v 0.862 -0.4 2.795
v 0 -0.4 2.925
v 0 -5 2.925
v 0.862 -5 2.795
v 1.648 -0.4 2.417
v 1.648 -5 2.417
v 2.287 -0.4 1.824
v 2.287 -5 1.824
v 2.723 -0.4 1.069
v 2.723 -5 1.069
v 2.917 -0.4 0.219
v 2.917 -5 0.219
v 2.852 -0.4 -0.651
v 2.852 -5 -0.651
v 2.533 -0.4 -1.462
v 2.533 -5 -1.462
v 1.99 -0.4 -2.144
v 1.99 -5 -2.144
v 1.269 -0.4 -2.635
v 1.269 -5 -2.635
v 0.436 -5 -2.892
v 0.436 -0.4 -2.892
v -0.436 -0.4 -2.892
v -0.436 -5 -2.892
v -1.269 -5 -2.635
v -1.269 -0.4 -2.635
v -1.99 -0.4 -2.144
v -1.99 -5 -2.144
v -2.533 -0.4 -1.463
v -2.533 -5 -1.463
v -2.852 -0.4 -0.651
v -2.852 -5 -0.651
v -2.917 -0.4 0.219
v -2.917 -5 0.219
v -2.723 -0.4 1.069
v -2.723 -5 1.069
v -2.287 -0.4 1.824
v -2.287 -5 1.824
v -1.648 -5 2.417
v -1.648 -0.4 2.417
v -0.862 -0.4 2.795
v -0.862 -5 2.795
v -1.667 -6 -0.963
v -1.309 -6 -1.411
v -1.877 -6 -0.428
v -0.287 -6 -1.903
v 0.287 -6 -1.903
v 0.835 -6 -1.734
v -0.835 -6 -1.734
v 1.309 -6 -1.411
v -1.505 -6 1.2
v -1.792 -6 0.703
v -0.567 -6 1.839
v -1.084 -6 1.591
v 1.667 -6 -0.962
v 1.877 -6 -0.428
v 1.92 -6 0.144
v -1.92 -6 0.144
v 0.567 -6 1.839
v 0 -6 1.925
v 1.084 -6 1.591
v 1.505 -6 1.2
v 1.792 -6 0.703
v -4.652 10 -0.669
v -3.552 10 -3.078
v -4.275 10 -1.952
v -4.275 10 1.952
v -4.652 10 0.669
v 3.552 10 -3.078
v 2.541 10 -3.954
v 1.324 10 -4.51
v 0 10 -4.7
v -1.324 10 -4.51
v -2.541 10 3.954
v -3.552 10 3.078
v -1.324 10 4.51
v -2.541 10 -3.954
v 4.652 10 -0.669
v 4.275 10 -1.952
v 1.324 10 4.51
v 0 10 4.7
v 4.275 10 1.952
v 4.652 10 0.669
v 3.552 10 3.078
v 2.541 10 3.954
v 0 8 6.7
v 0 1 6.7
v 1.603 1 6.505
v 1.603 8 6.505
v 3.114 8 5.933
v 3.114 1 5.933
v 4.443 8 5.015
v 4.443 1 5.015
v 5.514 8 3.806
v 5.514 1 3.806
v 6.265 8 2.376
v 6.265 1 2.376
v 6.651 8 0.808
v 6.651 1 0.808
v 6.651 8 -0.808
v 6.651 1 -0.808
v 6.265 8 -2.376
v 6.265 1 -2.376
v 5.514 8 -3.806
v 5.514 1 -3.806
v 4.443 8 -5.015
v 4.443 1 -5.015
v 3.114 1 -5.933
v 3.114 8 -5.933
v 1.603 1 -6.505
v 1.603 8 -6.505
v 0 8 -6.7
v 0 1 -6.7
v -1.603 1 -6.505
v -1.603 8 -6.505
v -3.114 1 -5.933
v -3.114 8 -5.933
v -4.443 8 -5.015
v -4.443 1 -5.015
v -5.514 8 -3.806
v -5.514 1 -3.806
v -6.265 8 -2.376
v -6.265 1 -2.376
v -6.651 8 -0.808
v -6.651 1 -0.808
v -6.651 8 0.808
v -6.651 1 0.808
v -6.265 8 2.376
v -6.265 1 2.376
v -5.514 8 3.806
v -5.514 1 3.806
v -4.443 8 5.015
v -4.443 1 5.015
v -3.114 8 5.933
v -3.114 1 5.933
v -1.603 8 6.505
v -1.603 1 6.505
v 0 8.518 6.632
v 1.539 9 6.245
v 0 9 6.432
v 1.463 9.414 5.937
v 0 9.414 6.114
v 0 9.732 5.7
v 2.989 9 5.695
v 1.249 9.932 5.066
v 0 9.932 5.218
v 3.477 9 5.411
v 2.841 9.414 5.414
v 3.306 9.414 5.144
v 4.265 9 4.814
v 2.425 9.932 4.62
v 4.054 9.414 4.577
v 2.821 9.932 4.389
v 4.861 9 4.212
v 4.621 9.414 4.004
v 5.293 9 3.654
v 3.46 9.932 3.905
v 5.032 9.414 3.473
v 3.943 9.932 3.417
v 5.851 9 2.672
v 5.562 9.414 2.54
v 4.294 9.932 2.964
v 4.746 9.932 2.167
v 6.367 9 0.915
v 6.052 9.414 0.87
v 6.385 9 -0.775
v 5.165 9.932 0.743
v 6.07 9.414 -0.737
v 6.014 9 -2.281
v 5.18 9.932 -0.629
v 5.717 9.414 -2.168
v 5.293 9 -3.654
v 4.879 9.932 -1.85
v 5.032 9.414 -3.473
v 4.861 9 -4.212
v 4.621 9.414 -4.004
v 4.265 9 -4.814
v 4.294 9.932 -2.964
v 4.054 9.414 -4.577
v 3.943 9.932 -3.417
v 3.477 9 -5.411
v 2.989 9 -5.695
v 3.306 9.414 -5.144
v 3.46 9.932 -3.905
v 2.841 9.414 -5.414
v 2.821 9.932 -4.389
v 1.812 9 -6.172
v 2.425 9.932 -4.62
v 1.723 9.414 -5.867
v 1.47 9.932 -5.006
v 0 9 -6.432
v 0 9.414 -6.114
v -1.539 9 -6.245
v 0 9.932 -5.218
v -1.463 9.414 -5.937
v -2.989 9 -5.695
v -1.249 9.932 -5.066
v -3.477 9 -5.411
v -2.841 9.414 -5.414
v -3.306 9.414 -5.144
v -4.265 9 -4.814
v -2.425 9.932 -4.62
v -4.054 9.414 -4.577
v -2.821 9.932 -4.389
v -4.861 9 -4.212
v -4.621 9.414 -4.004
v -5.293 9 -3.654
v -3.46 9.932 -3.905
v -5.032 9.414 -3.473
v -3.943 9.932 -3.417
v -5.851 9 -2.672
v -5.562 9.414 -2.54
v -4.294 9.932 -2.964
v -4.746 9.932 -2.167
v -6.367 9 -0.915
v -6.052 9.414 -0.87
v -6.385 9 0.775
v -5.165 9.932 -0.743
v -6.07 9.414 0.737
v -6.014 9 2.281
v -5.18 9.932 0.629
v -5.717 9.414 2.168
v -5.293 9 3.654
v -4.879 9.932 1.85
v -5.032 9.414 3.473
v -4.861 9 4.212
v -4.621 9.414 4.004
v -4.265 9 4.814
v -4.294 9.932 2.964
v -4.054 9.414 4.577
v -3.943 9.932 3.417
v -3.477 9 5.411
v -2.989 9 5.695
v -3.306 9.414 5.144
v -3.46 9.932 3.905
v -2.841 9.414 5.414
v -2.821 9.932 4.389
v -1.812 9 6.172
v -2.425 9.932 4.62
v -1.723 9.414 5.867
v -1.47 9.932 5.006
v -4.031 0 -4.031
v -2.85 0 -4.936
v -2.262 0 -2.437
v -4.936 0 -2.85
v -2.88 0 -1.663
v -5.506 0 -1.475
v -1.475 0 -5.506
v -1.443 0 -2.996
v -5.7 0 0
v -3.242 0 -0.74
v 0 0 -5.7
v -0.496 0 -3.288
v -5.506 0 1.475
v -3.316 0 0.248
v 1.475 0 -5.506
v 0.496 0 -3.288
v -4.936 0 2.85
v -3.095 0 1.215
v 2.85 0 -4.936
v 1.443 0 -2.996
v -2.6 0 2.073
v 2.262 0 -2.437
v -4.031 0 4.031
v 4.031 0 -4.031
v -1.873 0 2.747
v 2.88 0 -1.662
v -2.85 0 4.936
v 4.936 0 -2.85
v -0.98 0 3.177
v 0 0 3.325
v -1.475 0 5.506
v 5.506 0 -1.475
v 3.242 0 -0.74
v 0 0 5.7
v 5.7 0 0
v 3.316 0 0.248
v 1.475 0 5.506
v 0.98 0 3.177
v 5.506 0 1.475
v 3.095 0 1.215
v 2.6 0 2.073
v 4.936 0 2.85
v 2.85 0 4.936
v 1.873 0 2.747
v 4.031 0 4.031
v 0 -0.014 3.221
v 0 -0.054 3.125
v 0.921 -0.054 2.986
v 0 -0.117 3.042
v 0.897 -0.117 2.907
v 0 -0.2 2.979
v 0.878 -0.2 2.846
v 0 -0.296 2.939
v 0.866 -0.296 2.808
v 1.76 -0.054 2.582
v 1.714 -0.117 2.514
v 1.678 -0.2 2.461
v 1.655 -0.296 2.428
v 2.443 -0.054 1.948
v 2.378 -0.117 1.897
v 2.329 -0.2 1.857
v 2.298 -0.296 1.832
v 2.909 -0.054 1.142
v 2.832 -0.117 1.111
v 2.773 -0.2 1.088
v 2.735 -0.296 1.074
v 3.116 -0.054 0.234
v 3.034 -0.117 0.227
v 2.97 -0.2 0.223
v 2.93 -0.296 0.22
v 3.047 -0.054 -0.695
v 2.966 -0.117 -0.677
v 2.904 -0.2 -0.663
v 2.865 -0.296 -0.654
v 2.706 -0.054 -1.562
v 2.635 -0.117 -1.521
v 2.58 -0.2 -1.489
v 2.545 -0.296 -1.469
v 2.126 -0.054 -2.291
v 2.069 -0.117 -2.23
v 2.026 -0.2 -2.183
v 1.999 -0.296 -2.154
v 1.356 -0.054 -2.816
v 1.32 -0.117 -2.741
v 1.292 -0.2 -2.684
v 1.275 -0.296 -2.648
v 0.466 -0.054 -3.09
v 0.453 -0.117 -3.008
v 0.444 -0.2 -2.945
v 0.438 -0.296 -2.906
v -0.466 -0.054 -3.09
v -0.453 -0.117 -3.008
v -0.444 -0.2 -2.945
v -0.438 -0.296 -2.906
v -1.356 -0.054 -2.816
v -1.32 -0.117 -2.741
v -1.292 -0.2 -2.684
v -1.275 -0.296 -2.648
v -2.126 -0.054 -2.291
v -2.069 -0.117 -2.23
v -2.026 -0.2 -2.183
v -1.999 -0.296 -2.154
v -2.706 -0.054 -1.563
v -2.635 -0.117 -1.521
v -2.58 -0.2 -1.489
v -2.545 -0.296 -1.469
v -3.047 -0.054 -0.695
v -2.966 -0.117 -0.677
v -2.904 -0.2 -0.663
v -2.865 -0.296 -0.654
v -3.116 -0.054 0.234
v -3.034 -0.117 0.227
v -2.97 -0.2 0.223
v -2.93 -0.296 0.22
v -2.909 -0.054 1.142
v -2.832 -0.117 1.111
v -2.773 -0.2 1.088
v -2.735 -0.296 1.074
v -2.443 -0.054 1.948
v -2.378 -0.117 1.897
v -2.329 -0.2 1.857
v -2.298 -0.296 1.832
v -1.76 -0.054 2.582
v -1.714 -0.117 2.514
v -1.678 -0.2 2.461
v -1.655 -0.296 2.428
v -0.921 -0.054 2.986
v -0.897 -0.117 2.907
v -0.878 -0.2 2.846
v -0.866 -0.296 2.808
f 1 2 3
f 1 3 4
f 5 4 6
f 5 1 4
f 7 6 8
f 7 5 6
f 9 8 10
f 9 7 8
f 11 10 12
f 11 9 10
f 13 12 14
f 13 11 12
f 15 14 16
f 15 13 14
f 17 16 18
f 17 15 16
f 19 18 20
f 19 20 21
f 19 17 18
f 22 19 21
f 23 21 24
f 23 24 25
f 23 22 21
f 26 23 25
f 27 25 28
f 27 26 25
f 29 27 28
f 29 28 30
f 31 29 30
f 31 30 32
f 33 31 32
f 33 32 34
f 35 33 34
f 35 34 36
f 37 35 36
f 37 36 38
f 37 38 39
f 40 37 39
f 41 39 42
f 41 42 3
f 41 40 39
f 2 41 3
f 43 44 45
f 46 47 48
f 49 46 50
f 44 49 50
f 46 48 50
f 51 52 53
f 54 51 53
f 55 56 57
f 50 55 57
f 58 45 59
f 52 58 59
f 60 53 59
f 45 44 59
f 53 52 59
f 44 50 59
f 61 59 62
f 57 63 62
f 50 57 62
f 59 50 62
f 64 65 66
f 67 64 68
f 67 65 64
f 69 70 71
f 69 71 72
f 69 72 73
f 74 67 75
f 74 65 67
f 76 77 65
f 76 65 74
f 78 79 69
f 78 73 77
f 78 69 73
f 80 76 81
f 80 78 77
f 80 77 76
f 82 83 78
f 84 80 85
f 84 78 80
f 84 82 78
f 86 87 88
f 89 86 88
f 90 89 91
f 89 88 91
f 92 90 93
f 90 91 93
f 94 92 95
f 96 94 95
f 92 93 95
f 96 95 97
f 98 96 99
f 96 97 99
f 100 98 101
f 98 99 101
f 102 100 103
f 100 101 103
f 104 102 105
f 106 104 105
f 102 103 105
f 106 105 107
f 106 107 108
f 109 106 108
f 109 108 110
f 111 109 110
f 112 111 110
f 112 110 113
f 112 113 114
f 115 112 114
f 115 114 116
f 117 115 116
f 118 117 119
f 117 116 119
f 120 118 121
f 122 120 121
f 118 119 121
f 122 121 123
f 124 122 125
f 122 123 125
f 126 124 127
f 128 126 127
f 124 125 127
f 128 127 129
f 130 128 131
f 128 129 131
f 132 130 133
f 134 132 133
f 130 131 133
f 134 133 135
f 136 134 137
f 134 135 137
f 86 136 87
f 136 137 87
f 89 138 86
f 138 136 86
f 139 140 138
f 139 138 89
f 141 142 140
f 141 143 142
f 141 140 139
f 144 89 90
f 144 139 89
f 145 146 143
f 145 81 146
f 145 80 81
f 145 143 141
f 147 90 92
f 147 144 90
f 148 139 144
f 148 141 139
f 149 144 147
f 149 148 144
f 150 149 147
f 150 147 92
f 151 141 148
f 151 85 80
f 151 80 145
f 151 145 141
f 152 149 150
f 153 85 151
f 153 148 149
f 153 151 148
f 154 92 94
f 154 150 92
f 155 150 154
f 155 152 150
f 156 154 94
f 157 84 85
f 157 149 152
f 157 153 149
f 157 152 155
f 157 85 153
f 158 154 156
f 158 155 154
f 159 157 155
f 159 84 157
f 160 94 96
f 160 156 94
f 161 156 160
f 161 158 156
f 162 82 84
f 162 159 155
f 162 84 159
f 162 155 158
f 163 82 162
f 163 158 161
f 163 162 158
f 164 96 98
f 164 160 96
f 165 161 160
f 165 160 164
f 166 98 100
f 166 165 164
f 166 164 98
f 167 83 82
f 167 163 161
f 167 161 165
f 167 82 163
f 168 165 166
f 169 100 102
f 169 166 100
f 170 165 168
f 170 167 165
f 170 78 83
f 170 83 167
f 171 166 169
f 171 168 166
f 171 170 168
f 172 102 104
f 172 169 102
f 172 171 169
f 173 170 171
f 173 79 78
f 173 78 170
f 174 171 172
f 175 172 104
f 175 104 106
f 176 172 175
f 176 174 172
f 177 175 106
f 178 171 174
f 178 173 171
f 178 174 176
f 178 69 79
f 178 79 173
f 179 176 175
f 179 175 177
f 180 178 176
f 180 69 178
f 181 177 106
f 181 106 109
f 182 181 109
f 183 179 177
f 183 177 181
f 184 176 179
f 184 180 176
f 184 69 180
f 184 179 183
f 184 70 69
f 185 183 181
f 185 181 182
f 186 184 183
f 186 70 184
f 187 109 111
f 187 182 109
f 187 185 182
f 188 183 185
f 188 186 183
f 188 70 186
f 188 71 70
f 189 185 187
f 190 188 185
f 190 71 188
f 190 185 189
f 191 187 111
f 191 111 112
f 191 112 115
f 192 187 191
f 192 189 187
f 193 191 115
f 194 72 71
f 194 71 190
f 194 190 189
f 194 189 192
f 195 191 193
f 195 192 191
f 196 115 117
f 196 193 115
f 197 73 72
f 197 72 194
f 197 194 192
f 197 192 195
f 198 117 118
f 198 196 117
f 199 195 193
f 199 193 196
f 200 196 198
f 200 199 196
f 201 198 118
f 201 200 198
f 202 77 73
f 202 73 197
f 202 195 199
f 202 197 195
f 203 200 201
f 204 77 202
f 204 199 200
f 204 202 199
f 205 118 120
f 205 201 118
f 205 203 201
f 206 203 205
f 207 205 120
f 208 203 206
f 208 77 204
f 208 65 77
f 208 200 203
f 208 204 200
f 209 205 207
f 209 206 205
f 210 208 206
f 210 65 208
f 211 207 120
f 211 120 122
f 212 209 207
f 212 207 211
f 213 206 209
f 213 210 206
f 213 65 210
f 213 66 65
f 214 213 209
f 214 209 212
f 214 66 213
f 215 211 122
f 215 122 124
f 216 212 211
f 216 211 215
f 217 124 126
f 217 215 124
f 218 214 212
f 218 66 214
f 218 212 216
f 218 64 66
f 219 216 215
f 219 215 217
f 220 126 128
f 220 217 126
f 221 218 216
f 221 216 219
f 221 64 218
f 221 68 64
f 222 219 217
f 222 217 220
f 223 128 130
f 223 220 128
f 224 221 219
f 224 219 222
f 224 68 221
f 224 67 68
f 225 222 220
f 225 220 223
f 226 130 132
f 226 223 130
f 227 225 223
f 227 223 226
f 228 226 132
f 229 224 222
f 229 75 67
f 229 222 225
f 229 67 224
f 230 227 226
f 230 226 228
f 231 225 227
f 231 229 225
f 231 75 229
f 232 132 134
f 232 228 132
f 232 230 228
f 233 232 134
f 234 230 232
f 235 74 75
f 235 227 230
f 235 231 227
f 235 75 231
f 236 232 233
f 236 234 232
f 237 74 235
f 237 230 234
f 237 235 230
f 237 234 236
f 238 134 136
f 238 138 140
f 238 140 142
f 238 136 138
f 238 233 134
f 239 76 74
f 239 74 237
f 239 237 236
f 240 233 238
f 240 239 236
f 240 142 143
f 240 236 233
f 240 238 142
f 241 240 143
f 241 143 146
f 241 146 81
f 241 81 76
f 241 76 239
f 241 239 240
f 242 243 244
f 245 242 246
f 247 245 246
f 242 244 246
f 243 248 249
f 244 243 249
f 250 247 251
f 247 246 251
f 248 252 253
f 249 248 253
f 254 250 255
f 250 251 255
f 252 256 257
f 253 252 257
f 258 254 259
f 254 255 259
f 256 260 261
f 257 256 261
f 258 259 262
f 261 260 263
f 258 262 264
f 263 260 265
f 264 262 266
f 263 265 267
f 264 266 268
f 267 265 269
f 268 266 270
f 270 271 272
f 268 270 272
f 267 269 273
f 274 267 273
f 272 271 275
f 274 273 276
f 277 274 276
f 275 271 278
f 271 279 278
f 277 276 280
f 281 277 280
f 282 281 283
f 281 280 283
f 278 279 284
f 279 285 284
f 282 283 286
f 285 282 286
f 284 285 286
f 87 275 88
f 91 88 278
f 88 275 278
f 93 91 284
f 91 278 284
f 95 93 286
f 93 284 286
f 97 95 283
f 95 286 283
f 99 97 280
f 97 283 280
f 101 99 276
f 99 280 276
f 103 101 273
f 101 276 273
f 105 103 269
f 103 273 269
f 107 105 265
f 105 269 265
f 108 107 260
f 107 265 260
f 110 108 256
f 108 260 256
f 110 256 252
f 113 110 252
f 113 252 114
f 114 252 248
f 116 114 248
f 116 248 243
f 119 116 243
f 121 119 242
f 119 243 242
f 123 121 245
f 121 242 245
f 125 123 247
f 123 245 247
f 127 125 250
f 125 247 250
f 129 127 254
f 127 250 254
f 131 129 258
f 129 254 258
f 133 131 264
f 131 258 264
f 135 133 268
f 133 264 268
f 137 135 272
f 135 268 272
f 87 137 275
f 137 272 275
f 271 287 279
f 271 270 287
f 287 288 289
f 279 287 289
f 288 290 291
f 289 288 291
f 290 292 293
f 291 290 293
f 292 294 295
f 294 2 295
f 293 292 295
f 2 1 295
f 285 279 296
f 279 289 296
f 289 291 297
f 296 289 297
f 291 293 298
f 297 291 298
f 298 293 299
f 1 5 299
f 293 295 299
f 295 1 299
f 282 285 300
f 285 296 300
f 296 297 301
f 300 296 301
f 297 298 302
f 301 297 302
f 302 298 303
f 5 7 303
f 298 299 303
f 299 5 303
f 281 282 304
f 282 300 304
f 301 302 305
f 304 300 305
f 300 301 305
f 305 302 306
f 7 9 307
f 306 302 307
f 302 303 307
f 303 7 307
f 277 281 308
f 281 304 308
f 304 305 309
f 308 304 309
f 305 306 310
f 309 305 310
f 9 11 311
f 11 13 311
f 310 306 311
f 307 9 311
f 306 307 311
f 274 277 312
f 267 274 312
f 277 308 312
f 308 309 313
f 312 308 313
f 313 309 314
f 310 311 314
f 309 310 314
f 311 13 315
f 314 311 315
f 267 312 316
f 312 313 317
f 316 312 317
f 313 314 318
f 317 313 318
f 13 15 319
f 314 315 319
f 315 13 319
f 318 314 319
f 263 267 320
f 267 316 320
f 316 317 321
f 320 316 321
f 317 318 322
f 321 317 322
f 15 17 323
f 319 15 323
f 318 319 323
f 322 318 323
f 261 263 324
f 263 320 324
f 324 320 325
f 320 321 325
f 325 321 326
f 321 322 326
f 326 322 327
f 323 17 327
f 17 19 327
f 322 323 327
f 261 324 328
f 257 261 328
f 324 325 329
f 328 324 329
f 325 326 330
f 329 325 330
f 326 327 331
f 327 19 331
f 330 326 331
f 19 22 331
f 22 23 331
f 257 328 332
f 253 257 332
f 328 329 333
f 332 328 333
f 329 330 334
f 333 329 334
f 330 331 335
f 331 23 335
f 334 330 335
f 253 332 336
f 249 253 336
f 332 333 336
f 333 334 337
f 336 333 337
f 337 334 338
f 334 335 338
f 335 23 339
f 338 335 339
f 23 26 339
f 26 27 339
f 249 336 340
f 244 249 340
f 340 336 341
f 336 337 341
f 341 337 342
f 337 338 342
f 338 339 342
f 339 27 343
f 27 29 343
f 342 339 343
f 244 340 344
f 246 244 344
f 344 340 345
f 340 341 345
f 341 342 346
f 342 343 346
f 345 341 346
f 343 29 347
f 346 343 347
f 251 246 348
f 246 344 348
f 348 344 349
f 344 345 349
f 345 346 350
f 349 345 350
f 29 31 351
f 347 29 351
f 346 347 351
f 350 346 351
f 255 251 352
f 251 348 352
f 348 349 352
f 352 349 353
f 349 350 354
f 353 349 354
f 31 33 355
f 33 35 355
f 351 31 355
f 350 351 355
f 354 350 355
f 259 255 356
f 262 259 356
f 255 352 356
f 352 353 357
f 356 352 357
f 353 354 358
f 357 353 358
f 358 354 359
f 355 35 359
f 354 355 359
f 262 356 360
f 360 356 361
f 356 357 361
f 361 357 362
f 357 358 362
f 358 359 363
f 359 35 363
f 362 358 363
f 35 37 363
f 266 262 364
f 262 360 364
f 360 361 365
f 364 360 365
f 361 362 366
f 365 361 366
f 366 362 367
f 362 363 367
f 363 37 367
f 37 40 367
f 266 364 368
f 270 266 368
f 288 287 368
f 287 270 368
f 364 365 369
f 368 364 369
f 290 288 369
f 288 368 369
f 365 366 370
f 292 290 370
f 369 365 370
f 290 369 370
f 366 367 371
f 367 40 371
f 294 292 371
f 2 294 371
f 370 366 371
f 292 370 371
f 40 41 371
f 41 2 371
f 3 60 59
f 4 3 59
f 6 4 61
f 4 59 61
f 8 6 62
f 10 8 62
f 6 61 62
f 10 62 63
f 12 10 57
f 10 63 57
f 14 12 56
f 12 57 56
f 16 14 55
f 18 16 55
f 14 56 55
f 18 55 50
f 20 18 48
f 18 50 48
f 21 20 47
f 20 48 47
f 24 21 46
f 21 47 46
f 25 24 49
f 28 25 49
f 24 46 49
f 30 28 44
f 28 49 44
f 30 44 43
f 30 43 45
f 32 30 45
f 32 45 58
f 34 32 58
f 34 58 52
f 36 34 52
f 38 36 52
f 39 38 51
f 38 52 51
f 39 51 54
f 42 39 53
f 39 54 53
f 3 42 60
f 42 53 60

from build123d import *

# Parameters (mm, degrees)
SKETCH_1_R      = 6.7
EXTRUDE_1_DEPTH = 10
SKETCH_1_5_R    = 2.925
EXTRUDE_2_DEPTH = 6
CHAMFER_1_SIZE  = 1
FILLET_1_R      = 0.4
FILLET_2_R      = 2


with BuildPart() as part:
    # Эскиз1 → Бобышка-Вытянуть1 (new body)
    with BuildSketch(Plane(origin=(0, 0, 0), x_dir=(1, 0, 0), z_dir=(0, 1, 0))):
        Circle(SKETCH_1_R)
    extrude(amount=EXTRUDE_1_DEPTH)

    # Эскиз1<5> → Бобышка-Вытянуть2 (add)
    with BuildSketch(Plane(origin=(0, 0, 0), x_dir=(1, 0, 0), z_dir=(0, 1, 0))):
        Circle(SKETCH_1_5_R)
    extrude(amount=-EXTRUDE_2_DEPTH)

    # Фаска1
    chamfer_1_edges = [part.edges().sort_by_distance(p)[0] for p in [
        (-2.925, -6, 0),
        (-6.7, 0, 0),
    ]]
    chamfer(chamfer_1_edges, length=CHAMFER_1_SIZE)

    # Скругление1
    fillet_1_edges = [part.edges().sort_by_distance(p)[0] for p in [
        (-2.925, 0, 0),
    ]]
    fillet(fillet_1_edges, radius=FILLET_1_R)

    # Скругление2
    fillet_2_edges = [part.edges().sort_by_distance(p)[0] for p in [
        (-6.7, 10, 0),
    ]]
    fillet(fillet_2_edges, radius=FILLET_2_R)


solid = part.part
